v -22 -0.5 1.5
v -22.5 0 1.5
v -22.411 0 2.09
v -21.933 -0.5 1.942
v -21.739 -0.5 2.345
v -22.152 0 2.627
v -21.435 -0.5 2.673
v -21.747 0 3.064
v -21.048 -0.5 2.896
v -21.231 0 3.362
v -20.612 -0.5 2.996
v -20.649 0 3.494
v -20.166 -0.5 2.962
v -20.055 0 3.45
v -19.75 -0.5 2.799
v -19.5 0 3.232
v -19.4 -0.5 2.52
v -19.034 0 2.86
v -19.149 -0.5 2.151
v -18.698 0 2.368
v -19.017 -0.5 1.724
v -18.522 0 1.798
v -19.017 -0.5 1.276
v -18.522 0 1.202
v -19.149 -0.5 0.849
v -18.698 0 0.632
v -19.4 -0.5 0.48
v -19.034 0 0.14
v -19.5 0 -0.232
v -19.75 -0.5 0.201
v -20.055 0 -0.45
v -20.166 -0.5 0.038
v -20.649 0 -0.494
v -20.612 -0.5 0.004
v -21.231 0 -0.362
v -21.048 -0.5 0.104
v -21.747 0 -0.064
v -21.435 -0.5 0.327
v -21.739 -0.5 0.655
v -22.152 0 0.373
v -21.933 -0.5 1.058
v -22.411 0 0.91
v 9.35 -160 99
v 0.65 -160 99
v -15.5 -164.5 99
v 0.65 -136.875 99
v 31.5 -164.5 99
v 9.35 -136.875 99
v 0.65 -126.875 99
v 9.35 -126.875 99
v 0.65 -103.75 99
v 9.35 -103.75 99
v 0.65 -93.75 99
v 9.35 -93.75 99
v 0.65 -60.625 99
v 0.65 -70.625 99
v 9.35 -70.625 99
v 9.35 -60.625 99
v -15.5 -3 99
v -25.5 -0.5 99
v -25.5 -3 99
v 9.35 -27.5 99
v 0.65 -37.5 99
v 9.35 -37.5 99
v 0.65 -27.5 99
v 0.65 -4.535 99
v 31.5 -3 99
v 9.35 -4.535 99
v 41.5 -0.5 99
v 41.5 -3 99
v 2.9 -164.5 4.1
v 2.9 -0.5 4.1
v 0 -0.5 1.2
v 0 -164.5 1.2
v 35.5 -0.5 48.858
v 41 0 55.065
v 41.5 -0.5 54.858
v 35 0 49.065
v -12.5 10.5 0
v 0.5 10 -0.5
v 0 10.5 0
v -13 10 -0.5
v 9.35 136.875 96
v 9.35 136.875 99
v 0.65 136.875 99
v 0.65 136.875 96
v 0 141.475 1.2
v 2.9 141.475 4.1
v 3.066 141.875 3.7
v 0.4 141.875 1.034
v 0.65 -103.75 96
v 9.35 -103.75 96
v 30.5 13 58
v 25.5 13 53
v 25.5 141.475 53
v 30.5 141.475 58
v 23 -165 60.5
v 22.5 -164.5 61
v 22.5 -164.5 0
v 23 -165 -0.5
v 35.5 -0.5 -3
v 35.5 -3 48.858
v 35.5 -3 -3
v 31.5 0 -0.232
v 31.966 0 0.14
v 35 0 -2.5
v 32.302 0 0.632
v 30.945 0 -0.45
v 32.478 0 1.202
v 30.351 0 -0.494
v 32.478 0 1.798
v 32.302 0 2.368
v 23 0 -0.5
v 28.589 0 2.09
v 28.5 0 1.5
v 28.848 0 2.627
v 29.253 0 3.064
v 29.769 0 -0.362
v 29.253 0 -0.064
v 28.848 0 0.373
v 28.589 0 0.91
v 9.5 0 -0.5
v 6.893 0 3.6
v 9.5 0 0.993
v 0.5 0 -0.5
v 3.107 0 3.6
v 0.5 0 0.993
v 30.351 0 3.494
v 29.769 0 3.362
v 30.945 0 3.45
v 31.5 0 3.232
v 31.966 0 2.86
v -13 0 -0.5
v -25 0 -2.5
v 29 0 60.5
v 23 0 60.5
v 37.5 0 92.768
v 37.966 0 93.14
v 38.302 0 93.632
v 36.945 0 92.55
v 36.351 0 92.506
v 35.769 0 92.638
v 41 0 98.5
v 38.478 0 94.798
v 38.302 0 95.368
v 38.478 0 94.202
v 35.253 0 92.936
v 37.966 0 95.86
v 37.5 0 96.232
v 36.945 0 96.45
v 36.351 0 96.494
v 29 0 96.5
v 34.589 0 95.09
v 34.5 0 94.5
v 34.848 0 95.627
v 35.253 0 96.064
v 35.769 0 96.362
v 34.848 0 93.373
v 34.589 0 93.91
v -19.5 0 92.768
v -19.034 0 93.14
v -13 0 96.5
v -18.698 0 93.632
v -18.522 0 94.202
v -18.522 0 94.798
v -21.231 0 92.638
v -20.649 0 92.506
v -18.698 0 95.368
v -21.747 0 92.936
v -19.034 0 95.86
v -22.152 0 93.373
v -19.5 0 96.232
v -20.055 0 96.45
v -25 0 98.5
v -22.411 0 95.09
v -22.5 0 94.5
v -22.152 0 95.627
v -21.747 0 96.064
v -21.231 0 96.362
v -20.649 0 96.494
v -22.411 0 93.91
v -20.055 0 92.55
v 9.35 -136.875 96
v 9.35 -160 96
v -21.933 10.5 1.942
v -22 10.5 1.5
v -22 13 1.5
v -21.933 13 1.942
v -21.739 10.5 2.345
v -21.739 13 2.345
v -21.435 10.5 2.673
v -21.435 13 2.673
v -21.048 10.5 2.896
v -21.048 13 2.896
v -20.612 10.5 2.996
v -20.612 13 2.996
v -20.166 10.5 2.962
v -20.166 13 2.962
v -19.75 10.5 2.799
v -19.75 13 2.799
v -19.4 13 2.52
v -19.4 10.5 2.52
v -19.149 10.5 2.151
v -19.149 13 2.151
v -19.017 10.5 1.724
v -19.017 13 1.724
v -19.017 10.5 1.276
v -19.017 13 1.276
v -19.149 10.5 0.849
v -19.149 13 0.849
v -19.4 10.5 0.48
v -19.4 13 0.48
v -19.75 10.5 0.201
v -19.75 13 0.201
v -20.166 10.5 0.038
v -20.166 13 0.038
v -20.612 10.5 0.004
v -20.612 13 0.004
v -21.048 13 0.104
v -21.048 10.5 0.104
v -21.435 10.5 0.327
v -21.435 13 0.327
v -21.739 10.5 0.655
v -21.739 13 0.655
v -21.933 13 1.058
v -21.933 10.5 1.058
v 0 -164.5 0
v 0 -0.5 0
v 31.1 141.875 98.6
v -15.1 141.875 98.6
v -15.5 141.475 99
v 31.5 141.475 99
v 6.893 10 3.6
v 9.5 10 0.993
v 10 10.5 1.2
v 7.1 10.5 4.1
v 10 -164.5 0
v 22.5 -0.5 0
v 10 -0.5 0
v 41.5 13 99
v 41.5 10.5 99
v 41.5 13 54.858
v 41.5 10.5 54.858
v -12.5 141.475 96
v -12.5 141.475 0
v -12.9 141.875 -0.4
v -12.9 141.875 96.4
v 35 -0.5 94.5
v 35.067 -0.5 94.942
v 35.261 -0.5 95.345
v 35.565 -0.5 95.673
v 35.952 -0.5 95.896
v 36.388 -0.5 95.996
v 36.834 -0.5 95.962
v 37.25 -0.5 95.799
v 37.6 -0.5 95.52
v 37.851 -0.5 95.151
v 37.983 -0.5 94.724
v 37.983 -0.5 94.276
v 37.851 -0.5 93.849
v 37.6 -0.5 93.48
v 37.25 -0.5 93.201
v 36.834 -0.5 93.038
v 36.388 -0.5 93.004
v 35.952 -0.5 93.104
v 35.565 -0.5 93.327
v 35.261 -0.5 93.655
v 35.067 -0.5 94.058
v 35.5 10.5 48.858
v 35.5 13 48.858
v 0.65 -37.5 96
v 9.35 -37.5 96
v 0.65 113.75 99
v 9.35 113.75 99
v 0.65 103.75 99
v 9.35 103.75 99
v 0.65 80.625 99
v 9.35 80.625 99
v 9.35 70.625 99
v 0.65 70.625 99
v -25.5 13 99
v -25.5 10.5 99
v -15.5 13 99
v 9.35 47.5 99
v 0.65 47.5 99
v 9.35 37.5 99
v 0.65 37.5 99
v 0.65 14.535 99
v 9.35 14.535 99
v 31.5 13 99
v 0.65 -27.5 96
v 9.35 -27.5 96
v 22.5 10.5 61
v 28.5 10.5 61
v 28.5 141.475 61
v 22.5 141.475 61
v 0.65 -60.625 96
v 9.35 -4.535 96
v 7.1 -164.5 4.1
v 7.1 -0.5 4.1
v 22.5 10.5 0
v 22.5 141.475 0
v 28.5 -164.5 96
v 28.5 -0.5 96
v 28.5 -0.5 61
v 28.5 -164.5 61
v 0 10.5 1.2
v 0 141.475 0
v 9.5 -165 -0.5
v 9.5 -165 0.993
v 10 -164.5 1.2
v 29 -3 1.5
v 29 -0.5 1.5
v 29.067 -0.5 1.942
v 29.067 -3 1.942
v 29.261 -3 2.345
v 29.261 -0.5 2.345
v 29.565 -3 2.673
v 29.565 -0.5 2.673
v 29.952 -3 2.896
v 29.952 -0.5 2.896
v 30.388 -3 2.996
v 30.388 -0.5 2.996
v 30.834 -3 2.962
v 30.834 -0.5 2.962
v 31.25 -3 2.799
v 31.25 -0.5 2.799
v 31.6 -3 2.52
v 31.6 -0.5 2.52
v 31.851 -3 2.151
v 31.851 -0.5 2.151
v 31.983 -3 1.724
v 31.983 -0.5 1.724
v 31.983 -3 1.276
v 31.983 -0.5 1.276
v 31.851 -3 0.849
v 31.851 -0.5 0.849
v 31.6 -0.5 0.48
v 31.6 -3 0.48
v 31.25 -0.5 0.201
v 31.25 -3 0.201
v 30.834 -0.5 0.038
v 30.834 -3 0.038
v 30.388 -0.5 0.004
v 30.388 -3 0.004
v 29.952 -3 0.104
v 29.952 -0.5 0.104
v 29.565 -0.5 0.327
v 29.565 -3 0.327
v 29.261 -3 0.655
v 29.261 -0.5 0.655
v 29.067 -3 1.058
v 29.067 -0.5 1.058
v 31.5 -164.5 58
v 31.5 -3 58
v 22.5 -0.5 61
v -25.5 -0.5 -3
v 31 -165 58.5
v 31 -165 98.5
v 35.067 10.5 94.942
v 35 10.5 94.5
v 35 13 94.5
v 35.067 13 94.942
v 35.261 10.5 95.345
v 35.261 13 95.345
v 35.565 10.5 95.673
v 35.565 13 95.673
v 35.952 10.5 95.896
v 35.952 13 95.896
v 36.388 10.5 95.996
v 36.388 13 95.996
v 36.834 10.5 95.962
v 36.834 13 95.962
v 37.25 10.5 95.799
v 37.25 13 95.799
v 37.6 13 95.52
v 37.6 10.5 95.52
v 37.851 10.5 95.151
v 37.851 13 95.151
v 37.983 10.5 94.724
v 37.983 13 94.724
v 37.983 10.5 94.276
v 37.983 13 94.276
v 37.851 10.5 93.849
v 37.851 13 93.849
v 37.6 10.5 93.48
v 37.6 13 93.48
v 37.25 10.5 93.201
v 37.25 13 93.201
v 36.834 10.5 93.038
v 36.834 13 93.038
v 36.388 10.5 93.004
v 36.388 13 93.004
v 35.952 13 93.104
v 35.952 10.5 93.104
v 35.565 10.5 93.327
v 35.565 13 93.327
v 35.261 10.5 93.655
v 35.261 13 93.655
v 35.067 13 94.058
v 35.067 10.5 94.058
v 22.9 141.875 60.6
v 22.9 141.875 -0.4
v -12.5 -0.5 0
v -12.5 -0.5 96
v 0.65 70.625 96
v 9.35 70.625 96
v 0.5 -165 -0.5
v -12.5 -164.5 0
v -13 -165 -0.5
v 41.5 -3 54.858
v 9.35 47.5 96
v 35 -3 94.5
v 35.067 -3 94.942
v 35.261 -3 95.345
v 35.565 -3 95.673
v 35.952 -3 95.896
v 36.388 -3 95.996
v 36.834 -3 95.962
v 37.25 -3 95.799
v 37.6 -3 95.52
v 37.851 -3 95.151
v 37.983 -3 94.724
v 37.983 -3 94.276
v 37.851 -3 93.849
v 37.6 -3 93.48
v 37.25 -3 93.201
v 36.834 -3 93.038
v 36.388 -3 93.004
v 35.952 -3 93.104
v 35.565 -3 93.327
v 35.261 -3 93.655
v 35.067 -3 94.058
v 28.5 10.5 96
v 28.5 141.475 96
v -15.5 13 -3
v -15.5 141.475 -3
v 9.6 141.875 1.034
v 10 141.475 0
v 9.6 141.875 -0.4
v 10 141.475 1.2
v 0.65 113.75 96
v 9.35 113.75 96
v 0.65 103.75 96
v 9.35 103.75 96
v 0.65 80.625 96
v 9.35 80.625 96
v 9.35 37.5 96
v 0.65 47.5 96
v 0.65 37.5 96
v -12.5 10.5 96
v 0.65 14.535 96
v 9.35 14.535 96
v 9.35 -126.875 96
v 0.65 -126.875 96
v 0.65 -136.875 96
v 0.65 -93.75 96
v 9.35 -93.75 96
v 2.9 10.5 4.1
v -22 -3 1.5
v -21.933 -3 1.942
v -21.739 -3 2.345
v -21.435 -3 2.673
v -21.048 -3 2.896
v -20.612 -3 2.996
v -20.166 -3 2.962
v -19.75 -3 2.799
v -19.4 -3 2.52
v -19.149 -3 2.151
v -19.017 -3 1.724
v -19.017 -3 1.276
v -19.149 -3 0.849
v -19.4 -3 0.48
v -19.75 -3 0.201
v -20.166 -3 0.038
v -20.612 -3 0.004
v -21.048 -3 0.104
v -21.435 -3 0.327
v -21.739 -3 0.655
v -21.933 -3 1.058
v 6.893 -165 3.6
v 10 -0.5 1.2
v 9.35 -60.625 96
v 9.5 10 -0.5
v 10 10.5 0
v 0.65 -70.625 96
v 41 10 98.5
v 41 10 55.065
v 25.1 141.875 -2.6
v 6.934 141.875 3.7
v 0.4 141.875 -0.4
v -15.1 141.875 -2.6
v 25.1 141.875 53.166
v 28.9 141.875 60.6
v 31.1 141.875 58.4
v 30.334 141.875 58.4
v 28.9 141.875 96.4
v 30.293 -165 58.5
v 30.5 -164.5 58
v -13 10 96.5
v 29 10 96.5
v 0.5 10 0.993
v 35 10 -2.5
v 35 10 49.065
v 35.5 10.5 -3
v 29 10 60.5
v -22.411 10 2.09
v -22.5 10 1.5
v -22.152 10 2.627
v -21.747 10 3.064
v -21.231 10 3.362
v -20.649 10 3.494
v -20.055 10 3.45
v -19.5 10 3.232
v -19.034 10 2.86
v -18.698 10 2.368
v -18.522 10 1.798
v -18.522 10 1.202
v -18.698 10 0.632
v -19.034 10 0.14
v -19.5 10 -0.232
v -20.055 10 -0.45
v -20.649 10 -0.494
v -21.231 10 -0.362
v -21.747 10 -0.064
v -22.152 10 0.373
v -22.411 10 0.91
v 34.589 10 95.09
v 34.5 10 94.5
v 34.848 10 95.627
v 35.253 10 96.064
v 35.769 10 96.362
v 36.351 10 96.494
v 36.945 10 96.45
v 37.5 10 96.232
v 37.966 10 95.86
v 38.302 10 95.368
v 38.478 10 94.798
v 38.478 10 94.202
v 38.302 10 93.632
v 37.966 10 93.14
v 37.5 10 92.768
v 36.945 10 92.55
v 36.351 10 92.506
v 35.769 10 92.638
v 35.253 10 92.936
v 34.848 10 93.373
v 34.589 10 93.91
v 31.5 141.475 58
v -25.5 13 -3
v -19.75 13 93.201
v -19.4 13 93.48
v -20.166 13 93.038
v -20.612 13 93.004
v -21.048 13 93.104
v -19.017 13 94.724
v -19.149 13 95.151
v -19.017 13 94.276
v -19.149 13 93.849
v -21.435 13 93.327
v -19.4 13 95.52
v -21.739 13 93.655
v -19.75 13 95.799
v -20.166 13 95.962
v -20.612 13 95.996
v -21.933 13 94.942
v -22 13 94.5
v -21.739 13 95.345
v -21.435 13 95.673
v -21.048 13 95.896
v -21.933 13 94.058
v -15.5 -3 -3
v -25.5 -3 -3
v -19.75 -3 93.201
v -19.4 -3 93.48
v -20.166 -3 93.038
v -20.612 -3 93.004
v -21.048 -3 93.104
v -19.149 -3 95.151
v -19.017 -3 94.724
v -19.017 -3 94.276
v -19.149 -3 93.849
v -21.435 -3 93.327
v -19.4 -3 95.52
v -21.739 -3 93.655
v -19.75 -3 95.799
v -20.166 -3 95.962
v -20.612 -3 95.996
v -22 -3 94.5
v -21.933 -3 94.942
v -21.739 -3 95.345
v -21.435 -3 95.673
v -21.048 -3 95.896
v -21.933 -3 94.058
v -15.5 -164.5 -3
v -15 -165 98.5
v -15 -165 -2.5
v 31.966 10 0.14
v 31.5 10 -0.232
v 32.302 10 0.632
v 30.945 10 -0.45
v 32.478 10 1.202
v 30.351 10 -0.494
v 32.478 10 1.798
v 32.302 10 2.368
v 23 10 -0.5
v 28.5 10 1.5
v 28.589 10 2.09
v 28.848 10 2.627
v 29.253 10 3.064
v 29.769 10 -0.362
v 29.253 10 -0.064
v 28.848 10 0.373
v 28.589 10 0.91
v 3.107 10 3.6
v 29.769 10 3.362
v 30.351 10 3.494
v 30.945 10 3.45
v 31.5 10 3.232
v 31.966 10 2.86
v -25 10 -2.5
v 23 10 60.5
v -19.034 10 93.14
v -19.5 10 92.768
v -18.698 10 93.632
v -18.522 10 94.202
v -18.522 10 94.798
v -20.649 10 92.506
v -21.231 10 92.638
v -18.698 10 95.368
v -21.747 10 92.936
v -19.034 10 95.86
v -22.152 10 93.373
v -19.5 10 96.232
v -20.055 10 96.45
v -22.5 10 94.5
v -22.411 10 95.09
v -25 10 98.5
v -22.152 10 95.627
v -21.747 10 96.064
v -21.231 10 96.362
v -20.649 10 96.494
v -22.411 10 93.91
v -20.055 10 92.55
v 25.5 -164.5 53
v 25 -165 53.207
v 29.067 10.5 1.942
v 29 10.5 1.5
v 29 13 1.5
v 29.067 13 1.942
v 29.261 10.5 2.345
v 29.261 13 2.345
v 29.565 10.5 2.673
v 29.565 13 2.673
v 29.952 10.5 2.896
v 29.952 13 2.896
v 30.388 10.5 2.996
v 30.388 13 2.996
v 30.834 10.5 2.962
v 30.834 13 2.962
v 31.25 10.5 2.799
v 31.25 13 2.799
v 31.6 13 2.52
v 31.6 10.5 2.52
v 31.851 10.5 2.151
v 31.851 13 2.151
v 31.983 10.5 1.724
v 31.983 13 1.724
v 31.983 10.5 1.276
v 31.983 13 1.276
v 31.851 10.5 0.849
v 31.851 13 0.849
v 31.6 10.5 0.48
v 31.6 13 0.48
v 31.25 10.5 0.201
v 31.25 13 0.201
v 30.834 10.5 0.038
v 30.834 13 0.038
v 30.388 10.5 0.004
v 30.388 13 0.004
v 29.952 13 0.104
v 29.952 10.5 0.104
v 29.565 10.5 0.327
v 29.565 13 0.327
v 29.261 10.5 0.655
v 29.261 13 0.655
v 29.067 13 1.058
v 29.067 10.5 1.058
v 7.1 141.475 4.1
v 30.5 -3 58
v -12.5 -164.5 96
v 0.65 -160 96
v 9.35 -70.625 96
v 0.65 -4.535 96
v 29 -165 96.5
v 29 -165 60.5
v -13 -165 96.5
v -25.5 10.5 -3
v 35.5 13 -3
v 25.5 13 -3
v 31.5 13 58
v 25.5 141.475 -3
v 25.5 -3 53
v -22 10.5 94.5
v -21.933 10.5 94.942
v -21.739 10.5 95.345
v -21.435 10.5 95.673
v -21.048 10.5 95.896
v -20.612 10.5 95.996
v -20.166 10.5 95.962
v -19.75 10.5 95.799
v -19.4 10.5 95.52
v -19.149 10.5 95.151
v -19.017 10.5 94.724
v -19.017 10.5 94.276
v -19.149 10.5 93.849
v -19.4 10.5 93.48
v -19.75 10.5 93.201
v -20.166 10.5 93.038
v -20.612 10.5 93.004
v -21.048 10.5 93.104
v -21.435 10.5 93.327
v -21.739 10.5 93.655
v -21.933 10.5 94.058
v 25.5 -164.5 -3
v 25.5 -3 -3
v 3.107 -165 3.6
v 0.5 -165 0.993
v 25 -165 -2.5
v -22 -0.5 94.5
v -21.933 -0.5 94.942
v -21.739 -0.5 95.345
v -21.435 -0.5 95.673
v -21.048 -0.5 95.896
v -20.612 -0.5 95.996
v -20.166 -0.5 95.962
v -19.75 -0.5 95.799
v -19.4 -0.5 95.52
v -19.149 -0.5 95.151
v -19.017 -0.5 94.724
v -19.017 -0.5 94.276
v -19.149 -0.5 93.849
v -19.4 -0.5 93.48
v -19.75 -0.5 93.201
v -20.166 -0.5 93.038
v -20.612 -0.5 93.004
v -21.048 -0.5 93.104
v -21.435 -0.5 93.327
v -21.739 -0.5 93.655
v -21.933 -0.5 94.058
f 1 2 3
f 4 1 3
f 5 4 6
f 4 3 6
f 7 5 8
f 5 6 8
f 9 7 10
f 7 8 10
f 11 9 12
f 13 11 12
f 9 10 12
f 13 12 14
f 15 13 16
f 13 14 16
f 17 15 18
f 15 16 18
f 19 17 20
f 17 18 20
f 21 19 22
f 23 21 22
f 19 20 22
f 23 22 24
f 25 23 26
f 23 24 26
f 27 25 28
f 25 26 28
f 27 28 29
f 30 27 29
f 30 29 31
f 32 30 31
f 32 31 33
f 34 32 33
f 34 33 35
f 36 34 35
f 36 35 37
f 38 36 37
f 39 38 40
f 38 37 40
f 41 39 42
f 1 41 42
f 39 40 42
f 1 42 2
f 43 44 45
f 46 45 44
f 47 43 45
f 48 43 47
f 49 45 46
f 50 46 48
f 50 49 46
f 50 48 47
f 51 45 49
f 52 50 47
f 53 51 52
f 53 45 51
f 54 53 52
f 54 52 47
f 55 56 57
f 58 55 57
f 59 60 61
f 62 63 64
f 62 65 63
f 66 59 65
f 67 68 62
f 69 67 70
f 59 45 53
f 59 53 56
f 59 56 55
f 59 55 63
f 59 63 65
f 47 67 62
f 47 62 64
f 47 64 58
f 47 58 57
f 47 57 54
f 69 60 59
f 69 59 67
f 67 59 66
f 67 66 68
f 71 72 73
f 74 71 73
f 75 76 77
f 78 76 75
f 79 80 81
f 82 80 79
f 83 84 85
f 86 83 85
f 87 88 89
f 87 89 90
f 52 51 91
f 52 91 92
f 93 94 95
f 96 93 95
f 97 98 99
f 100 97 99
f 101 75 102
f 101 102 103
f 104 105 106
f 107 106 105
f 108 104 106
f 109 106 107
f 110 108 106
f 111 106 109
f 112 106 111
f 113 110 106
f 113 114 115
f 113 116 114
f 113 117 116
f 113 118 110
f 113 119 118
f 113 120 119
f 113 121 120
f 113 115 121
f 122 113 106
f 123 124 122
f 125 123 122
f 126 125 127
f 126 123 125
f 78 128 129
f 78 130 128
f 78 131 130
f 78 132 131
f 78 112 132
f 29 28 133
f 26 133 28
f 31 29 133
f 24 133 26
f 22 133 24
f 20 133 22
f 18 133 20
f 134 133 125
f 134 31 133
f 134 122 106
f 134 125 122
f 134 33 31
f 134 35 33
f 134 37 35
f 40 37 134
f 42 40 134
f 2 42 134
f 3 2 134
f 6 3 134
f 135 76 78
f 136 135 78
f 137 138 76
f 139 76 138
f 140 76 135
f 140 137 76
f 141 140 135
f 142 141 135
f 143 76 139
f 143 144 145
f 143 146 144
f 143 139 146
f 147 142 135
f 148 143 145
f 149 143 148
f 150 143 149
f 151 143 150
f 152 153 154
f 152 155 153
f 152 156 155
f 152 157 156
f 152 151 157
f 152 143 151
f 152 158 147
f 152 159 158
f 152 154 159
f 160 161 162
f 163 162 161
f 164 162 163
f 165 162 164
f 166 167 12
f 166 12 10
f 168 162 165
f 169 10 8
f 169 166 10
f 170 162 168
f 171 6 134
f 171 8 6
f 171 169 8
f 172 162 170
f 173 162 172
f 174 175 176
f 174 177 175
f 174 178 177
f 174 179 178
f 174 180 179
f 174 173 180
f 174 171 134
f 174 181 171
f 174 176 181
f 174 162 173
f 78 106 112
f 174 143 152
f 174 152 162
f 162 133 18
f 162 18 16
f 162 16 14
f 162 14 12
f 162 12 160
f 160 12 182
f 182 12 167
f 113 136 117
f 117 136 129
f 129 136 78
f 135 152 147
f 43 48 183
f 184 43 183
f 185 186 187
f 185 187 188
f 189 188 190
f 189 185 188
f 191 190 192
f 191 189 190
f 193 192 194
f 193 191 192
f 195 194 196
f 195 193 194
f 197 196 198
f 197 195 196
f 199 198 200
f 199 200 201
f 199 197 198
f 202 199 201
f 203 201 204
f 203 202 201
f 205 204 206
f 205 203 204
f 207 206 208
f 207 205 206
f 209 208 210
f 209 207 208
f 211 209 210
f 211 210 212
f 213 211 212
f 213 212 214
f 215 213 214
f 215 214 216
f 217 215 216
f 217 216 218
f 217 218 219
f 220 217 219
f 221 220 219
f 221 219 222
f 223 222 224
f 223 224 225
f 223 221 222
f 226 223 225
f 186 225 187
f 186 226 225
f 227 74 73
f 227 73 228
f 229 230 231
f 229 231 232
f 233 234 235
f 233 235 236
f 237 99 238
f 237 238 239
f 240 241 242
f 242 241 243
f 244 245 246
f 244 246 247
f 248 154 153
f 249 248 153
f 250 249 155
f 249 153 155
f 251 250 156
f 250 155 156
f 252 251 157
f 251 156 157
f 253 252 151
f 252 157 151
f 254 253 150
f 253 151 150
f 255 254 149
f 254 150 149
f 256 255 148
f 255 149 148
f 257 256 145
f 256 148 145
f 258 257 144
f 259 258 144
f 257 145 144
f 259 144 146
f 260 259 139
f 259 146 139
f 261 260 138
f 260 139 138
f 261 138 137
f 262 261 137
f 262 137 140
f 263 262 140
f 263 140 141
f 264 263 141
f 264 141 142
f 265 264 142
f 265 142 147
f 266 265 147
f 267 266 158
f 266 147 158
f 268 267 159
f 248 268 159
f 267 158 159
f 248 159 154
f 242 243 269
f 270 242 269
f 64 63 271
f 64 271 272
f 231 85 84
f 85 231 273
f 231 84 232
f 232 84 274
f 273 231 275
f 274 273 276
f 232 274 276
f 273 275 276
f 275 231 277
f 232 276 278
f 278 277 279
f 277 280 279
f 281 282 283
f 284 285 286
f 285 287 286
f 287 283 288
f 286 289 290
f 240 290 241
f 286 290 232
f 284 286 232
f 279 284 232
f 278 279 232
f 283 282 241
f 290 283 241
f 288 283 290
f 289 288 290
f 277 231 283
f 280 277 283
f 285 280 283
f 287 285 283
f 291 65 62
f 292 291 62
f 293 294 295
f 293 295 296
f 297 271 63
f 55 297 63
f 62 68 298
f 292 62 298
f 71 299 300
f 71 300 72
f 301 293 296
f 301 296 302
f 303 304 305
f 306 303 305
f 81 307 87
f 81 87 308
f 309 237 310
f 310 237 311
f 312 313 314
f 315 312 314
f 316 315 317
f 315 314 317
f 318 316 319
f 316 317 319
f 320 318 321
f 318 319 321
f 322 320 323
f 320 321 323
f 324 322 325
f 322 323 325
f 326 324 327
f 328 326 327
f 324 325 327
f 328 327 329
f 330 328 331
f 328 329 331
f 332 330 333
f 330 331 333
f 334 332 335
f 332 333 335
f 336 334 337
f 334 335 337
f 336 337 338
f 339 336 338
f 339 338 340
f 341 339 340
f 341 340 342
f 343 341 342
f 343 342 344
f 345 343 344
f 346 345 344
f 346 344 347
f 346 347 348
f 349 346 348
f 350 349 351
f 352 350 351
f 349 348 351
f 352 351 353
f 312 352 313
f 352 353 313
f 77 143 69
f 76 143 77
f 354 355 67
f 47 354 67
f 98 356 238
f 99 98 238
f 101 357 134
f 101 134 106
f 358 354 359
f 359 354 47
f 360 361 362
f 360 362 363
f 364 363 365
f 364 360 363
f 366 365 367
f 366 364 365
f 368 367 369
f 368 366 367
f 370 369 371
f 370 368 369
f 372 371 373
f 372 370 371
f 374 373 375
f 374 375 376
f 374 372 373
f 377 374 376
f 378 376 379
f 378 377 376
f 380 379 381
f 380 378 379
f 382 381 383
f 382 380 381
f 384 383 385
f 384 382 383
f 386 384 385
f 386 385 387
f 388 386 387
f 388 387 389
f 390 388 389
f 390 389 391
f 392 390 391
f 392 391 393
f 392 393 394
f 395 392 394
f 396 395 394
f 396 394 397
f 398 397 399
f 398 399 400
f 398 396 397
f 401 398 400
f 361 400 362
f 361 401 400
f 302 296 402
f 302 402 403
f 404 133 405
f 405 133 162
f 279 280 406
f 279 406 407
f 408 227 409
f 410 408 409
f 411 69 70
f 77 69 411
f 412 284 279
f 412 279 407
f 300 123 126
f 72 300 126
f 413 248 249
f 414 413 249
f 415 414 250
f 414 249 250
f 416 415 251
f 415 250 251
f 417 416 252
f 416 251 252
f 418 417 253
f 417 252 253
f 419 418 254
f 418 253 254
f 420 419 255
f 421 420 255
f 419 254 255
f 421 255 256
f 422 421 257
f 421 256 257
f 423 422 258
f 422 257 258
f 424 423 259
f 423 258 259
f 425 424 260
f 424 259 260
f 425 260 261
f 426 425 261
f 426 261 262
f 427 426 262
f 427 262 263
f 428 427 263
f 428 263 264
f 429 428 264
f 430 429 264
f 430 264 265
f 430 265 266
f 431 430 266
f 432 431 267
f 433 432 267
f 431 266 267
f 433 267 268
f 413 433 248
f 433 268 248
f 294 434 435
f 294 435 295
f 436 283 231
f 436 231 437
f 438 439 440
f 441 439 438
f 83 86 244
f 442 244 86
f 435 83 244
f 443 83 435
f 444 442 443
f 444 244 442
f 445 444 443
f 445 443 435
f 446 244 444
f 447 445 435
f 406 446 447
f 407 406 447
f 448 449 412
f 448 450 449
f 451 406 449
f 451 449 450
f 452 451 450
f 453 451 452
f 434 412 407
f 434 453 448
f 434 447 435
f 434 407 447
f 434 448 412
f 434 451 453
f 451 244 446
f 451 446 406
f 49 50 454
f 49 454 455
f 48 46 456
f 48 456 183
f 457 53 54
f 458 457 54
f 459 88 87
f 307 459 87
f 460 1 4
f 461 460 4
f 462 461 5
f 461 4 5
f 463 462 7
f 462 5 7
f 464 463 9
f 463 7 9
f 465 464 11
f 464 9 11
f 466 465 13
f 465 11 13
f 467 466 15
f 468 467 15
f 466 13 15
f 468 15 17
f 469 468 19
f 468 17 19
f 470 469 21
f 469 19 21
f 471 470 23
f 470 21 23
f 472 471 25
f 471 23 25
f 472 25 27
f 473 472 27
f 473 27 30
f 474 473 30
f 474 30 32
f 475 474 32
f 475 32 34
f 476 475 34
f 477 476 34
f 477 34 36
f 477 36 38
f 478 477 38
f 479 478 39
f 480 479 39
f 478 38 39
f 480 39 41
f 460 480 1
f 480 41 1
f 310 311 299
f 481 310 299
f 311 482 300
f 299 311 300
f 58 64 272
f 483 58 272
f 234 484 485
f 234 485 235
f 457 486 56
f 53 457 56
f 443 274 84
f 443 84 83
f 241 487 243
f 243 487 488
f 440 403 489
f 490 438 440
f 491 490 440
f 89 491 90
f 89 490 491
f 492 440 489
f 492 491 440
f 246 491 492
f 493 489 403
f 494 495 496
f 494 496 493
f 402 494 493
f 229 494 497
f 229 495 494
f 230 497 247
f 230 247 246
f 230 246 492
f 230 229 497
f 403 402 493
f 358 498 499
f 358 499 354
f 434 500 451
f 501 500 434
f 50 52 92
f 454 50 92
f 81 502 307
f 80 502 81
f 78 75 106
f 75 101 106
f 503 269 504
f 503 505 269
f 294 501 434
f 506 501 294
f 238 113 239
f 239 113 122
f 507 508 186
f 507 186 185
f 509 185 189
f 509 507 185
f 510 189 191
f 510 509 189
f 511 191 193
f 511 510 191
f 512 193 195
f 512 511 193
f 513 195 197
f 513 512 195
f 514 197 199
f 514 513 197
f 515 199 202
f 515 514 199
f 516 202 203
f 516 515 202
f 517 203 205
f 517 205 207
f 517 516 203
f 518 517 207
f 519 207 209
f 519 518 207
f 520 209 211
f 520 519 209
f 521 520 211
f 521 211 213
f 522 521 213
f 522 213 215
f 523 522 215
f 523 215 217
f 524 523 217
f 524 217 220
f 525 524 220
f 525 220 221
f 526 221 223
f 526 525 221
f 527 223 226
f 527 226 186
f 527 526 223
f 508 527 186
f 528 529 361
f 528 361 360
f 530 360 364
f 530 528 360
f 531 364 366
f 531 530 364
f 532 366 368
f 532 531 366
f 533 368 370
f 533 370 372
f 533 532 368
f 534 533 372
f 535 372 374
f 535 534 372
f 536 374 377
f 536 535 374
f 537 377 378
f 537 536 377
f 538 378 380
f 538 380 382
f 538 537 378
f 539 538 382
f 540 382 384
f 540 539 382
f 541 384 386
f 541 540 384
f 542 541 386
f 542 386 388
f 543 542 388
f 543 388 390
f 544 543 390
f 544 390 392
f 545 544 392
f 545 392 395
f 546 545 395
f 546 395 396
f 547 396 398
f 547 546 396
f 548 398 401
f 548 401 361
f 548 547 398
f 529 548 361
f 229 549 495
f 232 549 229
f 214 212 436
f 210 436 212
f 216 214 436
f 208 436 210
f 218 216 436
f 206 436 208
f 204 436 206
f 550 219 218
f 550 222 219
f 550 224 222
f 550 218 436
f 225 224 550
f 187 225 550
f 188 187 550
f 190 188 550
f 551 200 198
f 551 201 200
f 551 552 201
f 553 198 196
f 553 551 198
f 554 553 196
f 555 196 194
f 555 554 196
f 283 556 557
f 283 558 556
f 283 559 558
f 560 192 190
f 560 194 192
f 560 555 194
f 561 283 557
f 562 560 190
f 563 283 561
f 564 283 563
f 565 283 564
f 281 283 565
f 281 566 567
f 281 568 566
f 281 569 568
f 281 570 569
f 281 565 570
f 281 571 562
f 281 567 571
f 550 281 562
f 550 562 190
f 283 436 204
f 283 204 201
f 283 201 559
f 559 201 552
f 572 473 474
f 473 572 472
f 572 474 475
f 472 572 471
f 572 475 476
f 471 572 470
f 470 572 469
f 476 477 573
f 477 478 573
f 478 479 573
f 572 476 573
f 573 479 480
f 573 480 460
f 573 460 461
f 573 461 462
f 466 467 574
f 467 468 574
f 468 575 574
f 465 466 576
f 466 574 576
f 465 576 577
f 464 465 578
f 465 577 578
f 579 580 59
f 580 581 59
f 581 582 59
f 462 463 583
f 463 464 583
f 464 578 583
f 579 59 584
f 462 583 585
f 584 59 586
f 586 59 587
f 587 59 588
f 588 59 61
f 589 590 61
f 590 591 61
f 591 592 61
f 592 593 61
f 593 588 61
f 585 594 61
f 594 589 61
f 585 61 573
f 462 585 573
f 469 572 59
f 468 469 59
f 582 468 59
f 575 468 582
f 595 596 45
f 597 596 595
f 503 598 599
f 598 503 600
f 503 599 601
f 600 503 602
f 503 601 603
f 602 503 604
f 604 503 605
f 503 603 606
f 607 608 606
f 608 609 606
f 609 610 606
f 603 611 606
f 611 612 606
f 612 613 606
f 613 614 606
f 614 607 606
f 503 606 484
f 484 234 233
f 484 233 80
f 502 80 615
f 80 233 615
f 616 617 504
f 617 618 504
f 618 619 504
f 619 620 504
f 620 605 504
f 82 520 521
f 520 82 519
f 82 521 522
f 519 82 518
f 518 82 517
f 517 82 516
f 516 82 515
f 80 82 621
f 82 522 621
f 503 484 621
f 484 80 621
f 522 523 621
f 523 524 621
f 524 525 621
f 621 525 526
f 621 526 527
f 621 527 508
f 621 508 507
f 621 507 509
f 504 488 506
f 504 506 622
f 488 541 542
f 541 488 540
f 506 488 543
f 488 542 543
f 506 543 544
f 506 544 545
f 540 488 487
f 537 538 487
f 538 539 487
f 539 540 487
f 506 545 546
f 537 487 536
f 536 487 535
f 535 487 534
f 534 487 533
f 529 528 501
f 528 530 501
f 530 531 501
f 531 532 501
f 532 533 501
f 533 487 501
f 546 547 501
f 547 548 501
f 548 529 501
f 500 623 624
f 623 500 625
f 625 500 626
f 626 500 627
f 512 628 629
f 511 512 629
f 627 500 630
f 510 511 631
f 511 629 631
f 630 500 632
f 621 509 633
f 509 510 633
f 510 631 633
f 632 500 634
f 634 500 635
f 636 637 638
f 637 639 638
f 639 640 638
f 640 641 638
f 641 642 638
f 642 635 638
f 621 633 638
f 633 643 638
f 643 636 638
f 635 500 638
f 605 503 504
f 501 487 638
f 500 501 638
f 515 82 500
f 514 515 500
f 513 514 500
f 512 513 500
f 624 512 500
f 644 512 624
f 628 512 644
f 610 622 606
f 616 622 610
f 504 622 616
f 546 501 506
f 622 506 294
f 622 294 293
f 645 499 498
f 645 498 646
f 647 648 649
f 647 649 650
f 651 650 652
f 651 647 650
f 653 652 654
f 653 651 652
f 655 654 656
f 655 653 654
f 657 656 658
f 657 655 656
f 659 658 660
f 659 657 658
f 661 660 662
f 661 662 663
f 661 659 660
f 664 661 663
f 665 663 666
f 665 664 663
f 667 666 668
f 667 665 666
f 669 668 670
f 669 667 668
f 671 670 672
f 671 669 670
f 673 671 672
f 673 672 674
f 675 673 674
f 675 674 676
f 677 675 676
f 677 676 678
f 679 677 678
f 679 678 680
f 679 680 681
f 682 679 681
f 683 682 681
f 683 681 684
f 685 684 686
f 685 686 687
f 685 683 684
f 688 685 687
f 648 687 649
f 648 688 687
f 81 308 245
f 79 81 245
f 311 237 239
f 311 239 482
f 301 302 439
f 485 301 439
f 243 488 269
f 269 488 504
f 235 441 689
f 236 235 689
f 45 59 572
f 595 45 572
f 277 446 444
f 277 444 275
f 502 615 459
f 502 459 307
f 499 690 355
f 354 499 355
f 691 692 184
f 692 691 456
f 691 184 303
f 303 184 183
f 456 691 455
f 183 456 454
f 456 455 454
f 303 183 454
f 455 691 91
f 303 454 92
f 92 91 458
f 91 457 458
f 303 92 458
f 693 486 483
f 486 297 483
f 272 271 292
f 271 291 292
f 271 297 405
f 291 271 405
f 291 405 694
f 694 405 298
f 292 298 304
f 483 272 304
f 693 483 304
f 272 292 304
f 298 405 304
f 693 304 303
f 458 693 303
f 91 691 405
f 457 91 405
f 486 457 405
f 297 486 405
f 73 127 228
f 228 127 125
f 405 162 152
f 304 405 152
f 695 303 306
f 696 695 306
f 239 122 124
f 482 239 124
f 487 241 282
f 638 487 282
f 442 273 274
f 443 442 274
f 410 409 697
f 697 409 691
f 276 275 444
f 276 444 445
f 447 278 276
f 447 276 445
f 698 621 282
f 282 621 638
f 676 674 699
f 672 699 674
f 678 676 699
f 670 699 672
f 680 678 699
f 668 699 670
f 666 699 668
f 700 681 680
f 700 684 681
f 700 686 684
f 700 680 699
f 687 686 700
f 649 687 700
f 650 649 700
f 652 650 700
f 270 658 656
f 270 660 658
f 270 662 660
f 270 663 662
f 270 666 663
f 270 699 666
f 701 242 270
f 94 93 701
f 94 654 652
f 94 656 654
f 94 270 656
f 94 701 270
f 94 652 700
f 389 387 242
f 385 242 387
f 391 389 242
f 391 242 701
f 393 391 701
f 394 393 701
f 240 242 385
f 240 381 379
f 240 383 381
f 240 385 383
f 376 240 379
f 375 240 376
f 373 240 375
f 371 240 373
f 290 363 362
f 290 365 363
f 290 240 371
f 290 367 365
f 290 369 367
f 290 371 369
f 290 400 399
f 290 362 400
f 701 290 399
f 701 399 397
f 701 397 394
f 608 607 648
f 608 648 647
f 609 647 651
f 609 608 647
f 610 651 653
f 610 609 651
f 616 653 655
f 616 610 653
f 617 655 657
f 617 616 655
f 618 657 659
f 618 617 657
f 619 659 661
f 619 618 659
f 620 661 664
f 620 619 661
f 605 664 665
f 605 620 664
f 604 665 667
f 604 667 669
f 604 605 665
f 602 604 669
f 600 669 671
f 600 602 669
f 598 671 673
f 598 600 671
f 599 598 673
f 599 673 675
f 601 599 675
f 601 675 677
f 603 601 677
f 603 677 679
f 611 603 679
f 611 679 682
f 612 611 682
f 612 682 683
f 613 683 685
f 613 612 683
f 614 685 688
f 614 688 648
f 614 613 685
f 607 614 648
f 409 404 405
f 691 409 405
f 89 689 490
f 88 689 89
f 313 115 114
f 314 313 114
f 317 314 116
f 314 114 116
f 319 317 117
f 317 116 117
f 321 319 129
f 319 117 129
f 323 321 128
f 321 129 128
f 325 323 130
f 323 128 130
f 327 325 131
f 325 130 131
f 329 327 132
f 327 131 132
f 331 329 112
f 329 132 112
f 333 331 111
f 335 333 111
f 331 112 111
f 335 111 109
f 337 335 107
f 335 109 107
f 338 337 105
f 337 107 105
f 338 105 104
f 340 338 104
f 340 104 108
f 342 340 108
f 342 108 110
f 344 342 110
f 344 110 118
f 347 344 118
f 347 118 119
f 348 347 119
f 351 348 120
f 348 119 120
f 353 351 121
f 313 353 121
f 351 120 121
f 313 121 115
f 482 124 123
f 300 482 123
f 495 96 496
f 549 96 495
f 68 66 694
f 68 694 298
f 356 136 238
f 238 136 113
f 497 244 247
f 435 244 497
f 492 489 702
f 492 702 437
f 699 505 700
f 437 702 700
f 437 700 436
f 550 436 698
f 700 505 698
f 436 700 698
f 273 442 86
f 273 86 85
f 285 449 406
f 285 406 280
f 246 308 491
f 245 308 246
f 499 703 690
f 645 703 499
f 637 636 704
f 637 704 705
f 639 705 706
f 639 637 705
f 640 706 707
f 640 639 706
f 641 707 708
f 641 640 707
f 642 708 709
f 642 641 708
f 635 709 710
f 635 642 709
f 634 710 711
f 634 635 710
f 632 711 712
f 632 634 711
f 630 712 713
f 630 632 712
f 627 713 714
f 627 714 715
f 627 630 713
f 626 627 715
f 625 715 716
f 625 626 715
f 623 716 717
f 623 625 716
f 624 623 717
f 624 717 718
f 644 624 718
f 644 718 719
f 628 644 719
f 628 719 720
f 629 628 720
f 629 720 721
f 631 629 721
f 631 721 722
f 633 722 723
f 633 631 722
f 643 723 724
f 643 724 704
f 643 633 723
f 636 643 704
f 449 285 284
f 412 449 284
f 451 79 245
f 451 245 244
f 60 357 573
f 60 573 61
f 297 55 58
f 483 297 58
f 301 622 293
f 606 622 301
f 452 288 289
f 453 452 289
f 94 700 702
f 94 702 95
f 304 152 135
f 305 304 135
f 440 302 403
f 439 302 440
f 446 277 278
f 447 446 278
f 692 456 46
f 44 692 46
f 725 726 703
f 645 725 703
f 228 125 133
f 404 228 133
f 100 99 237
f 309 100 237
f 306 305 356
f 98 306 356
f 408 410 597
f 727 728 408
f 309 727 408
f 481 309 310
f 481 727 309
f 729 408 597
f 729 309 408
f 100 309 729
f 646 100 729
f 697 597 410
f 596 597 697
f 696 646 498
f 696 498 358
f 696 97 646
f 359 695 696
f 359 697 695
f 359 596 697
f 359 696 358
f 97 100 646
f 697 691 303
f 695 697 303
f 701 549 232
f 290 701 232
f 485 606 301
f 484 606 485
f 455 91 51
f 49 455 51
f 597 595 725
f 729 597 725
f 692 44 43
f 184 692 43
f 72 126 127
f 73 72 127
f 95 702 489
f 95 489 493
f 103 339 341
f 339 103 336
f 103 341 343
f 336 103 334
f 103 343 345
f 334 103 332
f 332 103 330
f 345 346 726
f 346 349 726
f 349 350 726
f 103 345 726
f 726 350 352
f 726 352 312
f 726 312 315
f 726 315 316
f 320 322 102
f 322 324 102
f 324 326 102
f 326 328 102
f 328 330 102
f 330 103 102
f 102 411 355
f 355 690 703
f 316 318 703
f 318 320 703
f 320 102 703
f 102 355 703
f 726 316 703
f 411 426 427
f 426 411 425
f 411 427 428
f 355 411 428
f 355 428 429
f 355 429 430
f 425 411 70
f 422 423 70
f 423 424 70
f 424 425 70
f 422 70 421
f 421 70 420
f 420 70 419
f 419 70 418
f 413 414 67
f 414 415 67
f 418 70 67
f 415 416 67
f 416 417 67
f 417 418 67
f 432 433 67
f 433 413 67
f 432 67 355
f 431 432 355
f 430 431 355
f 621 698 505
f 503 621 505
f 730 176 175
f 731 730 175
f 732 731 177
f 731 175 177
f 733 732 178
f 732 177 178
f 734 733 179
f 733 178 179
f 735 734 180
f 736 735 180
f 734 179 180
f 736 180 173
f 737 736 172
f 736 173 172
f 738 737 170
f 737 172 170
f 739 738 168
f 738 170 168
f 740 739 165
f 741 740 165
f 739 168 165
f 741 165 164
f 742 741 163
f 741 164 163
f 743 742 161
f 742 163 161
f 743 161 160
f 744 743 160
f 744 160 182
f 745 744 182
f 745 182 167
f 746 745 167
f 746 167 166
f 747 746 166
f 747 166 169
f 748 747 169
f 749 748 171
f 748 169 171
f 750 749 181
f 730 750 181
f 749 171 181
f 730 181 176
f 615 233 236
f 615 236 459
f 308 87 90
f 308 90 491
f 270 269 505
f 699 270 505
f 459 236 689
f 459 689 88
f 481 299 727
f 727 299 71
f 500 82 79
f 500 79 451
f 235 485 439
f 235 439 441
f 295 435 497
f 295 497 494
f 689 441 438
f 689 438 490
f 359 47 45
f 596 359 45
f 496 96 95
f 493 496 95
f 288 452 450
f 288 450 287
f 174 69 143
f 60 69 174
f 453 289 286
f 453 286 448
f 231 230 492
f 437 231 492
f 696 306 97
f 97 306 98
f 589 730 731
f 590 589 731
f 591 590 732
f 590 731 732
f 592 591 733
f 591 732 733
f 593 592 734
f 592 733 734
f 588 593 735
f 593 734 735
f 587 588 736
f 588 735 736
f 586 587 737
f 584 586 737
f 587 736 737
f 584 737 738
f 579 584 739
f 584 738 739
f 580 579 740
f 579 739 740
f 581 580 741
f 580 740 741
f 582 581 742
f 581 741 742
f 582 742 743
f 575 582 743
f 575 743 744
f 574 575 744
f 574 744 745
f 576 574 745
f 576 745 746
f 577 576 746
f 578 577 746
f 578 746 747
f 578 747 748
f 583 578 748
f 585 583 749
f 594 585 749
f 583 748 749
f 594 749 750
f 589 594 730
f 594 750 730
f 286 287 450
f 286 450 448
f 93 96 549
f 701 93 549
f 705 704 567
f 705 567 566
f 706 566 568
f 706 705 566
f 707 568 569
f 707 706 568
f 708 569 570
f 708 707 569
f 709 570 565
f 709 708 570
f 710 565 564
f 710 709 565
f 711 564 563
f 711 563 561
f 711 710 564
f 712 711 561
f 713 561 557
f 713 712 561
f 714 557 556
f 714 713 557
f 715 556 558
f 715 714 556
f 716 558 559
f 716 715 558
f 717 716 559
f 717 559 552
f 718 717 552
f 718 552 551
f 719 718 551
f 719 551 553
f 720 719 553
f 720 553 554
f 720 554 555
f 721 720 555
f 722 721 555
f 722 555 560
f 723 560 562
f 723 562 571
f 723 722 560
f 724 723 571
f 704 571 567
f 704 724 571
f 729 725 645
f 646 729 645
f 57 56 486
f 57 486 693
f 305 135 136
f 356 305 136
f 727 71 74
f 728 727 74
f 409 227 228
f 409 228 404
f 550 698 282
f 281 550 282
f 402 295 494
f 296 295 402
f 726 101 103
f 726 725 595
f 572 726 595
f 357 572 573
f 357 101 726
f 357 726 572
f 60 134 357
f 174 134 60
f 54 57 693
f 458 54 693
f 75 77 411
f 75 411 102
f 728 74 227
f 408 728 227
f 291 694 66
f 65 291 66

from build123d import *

# Parameters (mm, degrees)
F1_DEPTH  = 165
F2_W      = 8.7
F2_H      = 5
F2_H_2    = 10
F2_H_3    = 4.5345870574
F3_DEPTH  = 3
F4_SIZE   = 5
F5_R      = 1.5
F6_DEPTH  = 3
F7_SIZE   = 0.5
F12_DEPTH = 33.125
F13_SIZE  = 0.4


with BuildPart() as f1:
    # F0 (on Front) → F1 (new body)
    with BuildSketch(Plane.XZ):
        Polygon((0, 1.2), (0, 0), (-12.5, 0), (-12.5, 96), (0.65, 96), (0.65, 99), (-15.5, 99), (-15.5, -3), (5, -3), (25.5, -3), (25.5, 58), (31.5, 58), (31.5, 99), (9.35, 99), (9.35, 96), (22.5, 96), (28.5, 96), (28.5, 61), (22.5, 61), (22.5, 0), (10, 0), (10, 1.2), (7.1, 4.1), (5, 4.1), (2.9, 4.1), align=None)
    extrude(amount=F1_DEPTH)

    # F2 (on face) → F3 (join, through all)
    with BuildSketch(Plane.XY.offset(99)):
        with Locations((5, -162.5)):
            Rectangle(F2_W, F2_H)
        Polygon((0.65, -131.875), (0.65, -136.875), (9.35, -136.875), (9.35, -126.875), (0.65, -126.875), align=None)
        with Locations((5, -98.75)):
            Rectangle(F2_W, F2_H_2)
        with Locations((5, -65.625)):
            Rectangle(F2_W, F2_H_2)
        with Locations((5, -32.5)):
            Rectangle(F2_W, F2_H_2)
        with Locations((5, -2.2672935287)):
            Rectangle(F2_W, F2_H_3)
    extrude(amount=-F3_DEPTH)

    # F4
    f4_edges = [f1.edges().sort_by_distance(p)[0] for p in [
        (25.5, -82.5, 58),
    ]]
    chamfer(f4_edges, length=F4_SIZE)

    # F5 (on face) → F6 (join)
    with BuildSketch(Plane(origin=(0, 0, 0), x_dir=(-1, 0, 0), z_dir=(0, 1, 0))):
        Polygon((25.5, -3), (25.5, 99), (-41.5, 99), (-41.5, 54.8578643763), (-35.5, 48.8578643763), (-35.5, -3), align=None)
        with Locations((-30.5, 1.5)):
            Circle(F5_R, mode=Mode.SUBTRACT)
        with Locations((20.5, 1.5)):
            Circle(F5_R, mode=Mode.SUBTRACT)
        with Locations((-36.5, 94.5)):
            Circle(F5_R, mode=Mode.SUBTRACT)
        Polygon((-22.5, 0), (-22.5, 61), (-28.5, 61), (-28.5, 96), (12.5, 96), (12.5, 0), (0, 0), (0, 1.2), (-2.9, 4.1), (-7.1, 4.1), (-10, 1.2), (-10, 0), align=None, mode=Mode.SUBTRACT)
        with Locations((20.5, 94.5)):
            Circle(F5_R, mode=Mode.SUBTRACT)
    extrude(amount=-F6_DEPTH)

    # F7
    f7_edges = [f1.edges().sort_by_distance(p)[0] for p in [
        (35.5, 0, 22.928932),
        (38.5, 0, 51.857864),
        (41.5, 0, 76.928932),
        (8, 0, 99),
        (-25.5, 0, 48),
        (5, 0, -3),
        (8, 0, 96),
        (28.5, 0, 78.5),
        (25.5, 0, 61),
        (22.5, 0, 30.5),
        (16.25, 0, 0),
        (10, 0, 0.6),
        (8.55, 0, 2.65),
        (5, 0, 4.1),
        (1.45, 0, 2.65),
        (0, 0, 0.6),
        (-6.25, 0, 0),
        (-12.5, 0, 48),
        (32, 0, 1.5),
        (38, 0, 94.5),
        (-19, 0, 94.5),
        (-19, 0, 1.5),
        (25.5, -165, 25),
        (28, -165, 55.5),
        (5, -165, -3),
        (31, -165, 58),
        (-15.5, -165, 48),
        (31.5, -165, 78.5),
        (8, -165, 99),
        (28.5, -165, 78.5),
        (25.5, -165, 61),
        (22.5, -165, 30.5),
        (16.25, -165, 0),
        (10, -165, 0.6),
        (8.55, -165, 2.65),
        (5, -165, 4.1),
        (1.45, -165, 2.65),
        (0, -165, 0.6),
        (-6.25, -165, 0),
        (-12.5, -165, 48),
        (8, -165, 96),
    ]]
    chamfer(f7_edges, length=F7_SIZE)


with BuildPart() as f9_1:
    # F9: instance of F1
    add(f1.part.mirror(Plane(origin=(6.7486416271, 5, 47.845952448), x_dir=(-1, 0, 0), z_dir=(0, 1, 0))))

    # F11 (on face) → F12 (cut, through all)
    with BuildSketch(Plane(origin=(0, 175, 0), x_dir=(-1, 0, 0), z_dir=(0, 1, 0))):
        Polygon((-30.5, -8), (20.5, -8), (20.5, 104), (-36.5, 104), (-36.5, 56.9289321881), (-30.5, 50.9289321881), align=None)
    extrude(amount=-F12_DEPTH, mode=Mode.SUBTRACT)

    # F13
    f13_edges = [f9_1.edges().sort_by_distance(p)[0] for p in [
        (25.5, 141.875, 25),
        (28, 141.875, 55.5),
        (31, 141.875, 58),
        (31.5, 141.875, 78.5),
        (8, 141.875, 99),
        (-15.5, 141.875, 48),
        (5, 141.875, -3),
        (28.5, 141.875, 78.5),
        (25.5, 141.875, 61),
        (22.5, 141.875, 30.5),
        (16.25, 141.875, 0),
        (10, 141.875, 0.6),
        (8.55, 141.875, 2.65),
        (5, 141.875, 4.1),
        (1.45, 141.875, 2.65),
        (0, 141.875, 0.6),
        (-6.25, 141.875, 0),
        (-12.5, 141.875, 48),
        (8, 141.875, 96),
    ]]
    chamfer(f13_edges, length=F13_SIZE)


solid = Compound([f1.part, f9_1.part])
